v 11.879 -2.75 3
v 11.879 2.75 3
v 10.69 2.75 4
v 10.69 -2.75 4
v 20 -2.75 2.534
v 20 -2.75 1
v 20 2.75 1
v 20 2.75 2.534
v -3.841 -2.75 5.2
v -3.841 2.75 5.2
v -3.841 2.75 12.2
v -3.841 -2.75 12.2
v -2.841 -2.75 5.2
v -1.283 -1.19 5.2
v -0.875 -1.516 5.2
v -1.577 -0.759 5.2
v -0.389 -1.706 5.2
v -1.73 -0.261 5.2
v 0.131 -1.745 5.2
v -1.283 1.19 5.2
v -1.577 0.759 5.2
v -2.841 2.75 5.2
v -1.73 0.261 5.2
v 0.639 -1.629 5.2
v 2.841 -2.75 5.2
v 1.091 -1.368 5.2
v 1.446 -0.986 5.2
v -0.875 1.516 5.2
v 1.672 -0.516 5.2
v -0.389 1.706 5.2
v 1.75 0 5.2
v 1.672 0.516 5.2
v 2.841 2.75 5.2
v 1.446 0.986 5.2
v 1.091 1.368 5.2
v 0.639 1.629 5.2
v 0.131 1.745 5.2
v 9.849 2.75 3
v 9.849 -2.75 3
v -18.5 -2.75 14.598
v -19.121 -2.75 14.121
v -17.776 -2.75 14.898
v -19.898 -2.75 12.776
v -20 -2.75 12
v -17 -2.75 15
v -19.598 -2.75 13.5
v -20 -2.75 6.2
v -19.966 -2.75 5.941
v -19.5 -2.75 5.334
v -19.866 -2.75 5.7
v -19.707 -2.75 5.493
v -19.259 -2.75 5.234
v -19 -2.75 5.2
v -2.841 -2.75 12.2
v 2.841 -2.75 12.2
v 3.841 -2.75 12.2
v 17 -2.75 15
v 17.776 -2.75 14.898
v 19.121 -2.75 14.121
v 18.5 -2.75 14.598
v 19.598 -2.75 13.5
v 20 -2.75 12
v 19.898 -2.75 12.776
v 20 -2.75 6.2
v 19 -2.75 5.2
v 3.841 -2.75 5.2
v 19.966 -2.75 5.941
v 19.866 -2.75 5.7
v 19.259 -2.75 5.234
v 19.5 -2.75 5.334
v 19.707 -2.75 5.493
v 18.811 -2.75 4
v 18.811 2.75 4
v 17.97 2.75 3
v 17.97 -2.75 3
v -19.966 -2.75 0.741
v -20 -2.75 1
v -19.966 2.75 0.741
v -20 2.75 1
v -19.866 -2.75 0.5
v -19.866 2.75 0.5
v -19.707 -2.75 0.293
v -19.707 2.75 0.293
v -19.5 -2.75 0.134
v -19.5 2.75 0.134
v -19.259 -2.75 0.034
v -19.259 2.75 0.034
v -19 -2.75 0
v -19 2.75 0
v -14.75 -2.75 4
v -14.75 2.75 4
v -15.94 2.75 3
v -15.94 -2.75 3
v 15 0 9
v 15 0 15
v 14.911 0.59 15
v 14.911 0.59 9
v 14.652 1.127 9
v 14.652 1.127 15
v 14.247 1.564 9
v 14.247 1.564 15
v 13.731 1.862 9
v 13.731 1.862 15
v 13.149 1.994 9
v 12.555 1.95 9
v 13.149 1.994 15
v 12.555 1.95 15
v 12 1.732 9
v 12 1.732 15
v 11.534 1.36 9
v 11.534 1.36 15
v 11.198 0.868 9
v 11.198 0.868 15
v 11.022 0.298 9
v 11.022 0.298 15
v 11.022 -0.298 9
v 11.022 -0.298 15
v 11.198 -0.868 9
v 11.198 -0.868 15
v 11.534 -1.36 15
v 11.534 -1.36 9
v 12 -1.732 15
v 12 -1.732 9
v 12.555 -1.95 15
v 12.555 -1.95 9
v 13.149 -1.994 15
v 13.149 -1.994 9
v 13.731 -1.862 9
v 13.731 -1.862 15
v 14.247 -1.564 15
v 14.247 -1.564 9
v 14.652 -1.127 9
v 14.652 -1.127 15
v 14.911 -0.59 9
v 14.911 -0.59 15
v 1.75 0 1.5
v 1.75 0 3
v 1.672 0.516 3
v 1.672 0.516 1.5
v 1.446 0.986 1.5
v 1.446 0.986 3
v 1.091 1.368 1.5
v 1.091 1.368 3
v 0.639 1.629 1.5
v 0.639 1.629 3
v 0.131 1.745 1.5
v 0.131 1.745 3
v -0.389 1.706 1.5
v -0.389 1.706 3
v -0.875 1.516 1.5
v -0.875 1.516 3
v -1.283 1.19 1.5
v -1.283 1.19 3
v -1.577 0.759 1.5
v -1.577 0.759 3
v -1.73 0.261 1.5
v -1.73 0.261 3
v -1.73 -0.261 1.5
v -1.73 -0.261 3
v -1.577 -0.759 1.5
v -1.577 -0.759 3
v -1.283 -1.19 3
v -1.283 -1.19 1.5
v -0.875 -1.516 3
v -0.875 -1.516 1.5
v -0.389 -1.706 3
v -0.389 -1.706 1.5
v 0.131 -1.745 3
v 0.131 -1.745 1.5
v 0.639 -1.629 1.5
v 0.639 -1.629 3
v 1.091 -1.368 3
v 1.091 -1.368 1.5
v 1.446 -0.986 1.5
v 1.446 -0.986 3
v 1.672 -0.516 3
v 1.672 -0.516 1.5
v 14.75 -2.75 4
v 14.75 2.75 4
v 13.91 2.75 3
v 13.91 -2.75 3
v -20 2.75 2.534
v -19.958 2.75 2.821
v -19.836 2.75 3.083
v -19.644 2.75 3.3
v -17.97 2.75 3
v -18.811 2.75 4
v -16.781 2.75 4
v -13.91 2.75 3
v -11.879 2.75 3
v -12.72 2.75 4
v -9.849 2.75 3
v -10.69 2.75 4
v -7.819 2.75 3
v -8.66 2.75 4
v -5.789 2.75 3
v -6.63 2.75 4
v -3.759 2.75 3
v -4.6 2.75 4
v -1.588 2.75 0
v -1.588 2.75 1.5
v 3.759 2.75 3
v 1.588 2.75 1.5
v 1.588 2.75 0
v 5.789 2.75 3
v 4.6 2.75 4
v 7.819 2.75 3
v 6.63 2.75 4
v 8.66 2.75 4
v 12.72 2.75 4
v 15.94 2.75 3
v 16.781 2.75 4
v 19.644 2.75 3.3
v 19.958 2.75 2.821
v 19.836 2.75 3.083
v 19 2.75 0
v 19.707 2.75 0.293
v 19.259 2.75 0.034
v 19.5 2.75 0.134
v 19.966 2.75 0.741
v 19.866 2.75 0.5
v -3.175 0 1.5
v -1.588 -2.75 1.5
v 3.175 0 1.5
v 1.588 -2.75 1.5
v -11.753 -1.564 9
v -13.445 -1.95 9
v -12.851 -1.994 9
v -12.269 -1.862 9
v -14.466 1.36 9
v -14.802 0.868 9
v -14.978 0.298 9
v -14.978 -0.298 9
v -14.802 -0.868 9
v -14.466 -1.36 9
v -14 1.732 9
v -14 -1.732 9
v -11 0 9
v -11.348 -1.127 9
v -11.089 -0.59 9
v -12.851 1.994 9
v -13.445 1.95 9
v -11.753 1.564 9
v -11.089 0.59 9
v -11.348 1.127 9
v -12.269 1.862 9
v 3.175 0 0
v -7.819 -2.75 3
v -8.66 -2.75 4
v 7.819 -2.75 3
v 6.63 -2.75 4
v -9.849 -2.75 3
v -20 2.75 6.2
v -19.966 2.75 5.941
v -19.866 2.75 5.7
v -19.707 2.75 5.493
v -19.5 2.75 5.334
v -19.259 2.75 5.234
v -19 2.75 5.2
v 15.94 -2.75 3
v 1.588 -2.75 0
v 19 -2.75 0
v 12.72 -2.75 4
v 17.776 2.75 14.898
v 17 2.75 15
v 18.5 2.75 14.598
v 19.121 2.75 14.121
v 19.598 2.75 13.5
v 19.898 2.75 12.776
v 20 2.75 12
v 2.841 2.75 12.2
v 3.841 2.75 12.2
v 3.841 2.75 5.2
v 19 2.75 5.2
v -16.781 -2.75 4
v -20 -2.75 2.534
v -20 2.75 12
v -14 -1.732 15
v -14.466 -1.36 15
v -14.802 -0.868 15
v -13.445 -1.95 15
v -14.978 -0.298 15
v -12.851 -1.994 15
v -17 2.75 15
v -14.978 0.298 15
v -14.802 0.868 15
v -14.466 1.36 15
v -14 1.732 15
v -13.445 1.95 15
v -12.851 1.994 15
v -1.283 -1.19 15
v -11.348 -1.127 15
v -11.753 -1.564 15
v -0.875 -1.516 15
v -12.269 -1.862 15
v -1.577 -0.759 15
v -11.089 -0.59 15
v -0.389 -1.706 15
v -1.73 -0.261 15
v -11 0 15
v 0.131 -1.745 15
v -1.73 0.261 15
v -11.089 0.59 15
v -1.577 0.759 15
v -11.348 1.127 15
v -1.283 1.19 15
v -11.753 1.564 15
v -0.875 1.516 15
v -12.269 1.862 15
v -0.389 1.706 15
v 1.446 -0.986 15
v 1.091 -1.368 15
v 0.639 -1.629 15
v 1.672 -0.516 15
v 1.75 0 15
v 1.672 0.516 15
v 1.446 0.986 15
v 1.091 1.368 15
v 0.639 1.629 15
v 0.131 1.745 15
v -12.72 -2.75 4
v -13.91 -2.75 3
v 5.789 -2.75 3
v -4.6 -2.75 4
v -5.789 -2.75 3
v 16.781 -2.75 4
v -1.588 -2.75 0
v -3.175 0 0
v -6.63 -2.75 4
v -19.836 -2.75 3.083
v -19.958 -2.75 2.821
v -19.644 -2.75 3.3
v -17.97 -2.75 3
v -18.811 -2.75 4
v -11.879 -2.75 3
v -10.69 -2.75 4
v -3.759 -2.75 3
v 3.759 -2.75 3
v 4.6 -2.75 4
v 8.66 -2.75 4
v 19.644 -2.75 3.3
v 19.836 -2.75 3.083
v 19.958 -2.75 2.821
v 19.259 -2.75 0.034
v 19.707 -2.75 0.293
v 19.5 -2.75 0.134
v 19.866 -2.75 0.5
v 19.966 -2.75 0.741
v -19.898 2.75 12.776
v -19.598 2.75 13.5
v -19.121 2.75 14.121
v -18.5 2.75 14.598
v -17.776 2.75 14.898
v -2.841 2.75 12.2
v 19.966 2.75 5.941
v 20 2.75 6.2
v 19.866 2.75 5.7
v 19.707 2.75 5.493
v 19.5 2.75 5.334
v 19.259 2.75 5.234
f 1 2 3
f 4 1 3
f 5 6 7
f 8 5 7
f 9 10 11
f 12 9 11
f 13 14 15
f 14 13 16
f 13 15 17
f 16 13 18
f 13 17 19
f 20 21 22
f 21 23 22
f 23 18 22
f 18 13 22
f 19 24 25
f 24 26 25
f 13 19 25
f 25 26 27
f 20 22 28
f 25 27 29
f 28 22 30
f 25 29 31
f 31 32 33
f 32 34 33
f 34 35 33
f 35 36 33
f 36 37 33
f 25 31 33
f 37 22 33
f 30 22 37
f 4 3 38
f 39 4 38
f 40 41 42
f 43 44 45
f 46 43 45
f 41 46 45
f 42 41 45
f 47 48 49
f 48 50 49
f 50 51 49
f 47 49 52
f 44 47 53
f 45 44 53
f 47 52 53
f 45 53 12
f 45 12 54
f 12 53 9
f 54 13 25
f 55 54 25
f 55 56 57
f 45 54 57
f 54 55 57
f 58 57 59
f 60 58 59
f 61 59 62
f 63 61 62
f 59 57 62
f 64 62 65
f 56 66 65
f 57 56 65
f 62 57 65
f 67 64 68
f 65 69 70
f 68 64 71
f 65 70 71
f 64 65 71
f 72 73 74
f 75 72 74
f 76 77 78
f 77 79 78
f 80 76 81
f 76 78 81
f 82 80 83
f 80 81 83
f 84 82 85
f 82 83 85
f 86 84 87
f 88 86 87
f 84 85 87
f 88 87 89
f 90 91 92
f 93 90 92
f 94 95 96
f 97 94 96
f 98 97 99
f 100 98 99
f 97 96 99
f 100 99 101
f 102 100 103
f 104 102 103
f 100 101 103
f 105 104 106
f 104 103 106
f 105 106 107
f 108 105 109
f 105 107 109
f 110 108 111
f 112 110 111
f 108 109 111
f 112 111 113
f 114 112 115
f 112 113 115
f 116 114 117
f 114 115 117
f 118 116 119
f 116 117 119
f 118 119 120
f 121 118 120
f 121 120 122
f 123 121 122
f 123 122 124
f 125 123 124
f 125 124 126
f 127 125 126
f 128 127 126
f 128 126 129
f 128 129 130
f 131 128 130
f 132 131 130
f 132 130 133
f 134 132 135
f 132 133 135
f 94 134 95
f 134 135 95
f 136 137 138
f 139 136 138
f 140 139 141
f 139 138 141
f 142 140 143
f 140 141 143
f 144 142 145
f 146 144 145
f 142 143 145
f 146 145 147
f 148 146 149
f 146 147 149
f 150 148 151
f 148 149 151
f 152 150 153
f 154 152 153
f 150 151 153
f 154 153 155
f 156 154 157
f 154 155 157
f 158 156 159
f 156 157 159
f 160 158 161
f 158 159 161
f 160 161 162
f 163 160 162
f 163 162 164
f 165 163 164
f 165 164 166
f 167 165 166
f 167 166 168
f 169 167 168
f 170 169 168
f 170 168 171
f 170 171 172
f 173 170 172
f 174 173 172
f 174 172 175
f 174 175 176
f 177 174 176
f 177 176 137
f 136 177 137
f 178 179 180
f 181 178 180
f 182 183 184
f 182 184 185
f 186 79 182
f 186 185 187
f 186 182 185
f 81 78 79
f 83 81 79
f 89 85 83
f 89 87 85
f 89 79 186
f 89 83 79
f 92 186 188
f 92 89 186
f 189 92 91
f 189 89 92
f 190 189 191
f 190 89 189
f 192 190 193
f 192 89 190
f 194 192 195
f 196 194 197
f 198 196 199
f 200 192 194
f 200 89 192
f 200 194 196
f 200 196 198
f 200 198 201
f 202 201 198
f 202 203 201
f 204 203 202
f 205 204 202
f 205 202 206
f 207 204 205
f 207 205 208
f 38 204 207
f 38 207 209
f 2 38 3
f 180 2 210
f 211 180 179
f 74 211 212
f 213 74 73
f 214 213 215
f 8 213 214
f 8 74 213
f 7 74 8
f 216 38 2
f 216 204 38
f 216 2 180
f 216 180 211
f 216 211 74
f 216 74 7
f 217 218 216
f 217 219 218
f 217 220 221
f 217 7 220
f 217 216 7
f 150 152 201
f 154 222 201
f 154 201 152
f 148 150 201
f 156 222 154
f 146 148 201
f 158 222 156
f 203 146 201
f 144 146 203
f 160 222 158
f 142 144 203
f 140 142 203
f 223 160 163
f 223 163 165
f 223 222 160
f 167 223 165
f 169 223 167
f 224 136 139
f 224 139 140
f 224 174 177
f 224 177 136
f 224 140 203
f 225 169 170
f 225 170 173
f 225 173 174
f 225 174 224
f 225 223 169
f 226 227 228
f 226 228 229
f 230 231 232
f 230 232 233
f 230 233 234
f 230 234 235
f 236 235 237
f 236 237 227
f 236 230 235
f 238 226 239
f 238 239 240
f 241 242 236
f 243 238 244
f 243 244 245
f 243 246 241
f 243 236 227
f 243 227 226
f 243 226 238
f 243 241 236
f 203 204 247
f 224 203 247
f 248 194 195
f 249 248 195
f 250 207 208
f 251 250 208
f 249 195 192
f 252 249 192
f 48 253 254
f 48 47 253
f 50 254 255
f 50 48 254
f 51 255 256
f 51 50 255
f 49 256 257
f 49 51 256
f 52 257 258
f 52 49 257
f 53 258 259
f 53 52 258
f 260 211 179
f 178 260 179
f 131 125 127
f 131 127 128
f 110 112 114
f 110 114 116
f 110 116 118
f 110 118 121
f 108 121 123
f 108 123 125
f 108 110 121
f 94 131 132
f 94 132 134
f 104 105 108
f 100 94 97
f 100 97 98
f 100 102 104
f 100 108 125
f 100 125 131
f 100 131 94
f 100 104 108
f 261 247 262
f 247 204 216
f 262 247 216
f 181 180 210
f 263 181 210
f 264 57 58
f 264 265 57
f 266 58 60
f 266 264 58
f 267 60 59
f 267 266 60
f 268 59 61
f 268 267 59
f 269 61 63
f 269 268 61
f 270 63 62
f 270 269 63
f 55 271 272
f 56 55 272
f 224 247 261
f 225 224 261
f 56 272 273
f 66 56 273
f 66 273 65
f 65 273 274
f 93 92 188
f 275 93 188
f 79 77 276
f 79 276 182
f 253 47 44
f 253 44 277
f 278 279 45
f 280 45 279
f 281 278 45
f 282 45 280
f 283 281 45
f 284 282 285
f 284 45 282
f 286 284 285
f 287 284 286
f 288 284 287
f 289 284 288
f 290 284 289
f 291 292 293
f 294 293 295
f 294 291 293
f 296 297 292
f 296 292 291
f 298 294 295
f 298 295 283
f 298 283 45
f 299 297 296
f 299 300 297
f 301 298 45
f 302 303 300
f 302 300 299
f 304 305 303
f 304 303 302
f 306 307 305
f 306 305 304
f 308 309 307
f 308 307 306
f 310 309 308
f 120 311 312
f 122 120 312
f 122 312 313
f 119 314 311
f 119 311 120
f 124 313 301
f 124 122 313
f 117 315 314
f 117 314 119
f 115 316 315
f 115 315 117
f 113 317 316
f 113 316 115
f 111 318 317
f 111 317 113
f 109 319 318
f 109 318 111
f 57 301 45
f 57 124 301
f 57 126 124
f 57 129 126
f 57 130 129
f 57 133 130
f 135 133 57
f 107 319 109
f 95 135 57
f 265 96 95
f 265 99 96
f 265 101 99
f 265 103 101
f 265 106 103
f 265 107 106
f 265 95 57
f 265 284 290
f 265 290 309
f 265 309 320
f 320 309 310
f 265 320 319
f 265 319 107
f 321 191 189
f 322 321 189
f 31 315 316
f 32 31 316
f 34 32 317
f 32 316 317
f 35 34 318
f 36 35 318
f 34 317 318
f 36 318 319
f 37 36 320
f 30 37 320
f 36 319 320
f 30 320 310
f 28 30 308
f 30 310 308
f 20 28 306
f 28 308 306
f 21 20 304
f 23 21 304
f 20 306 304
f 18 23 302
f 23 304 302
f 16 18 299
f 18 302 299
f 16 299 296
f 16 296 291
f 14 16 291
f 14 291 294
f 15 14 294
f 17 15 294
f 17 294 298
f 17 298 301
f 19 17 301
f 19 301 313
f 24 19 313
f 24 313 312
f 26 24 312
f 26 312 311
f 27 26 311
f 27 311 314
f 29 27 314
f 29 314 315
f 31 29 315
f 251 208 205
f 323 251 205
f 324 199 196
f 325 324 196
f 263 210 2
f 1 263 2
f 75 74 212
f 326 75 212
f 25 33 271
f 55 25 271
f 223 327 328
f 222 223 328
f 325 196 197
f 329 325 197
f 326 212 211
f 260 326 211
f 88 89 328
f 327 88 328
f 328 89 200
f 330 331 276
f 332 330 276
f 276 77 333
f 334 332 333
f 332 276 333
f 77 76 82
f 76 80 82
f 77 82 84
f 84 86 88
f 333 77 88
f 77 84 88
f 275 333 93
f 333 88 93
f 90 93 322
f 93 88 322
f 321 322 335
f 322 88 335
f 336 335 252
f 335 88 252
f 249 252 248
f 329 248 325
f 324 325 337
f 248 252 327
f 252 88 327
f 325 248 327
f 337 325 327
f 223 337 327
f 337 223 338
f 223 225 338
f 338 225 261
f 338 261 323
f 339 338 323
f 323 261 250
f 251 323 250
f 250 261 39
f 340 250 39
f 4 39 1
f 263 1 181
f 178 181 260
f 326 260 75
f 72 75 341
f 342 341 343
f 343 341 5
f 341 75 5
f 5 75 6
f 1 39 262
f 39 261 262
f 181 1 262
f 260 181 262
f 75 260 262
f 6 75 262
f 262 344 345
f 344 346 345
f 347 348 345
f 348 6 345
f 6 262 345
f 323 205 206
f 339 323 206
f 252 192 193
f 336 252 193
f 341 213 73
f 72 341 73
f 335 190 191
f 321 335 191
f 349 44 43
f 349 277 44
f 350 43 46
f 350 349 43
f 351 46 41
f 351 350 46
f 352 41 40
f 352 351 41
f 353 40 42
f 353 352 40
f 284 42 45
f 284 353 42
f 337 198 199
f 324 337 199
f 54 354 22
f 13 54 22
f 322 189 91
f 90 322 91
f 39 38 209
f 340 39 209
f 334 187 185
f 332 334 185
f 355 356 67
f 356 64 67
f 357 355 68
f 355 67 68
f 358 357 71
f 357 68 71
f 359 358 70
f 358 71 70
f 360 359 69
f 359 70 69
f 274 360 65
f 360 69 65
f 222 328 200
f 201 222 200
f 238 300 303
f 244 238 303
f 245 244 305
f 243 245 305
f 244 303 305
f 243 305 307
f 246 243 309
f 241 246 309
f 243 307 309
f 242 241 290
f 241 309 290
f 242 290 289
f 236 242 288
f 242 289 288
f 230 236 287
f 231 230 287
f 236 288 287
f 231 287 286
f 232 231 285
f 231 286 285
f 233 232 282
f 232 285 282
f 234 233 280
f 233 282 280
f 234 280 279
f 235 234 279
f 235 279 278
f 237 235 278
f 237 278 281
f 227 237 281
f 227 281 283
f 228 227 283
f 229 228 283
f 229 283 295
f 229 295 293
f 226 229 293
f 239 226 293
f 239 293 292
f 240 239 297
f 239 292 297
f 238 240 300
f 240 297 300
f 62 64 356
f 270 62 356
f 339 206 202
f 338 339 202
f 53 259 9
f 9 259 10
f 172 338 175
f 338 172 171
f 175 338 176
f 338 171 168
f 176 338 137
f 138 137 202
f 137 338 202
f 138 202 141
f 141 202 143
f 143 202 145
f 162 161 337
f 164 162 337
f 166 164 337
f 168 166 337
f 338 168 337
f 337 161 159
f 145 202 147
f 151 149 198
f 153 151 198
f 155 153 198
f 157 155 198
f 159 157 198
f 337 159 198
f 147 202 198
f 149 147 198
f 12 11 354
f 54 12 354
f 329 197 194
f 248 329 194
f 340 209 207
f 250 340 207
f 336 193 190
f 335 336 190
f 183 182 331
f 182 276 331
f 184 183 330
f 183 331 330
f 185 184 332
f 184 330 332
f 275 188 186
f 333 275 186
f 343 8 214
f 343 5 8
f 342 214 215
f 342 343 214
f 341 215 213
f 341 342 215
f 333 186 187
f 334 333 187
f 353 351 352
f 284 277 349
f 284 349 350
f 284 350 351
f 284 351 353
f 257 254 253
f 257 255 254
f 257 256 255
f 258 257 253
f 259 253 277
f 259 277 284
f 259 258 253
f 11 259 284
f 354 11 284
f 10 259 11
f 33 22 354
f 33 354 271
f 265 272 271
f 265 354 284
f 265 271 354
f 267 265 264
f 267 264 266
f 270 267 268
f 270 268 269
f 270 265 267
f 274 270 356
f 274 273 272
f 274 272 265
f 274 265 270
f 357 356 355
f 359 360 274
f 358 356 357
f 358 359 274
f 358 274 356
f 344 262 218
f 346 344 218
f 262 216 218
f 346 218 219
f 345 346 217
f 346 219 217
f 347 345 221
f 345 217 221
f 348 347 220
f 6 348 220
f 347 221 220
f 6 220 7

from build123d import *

# Parameters (mm, degrees)
F0_W      = 40
F0_H      = 5.5
F1_DEPTH  = 15
F3_DEPTH  = 6
F4_R      = 3
F5_R      = 2
F6_DEPTH  = 6
F7_R      = 1
F9_DEPTH  = 1.5
F10_R     = 1.75
F11_DEPTH = 25


# Not quite as in the source:
# - a feature names something its author has since deleted; it is built from what else it names


with BuildPart() as f1:
    # F0 (on Top) → F1 (new body)
    with BuildSketch(Plane.XY):
        Rectangle(F0_W, F0_H)
    extrude(amount=F1_DEPTH)

    # F2 (on face) → F3 (cut)
    with BuildSketch(Plane(origin=(0, 2.75, 0), x_dir=(-1, 0, 0), z_dir=(0, 1, 0))):
        Polygon((0, 3), (3.758946807, 3), (4.599775356, 4), (5.7890784562, 3), (6.6299070052, 4), (7.8192101053, 3), (8.6600386543, 4), (9.8493417544, 3), (10.6901703034, 4), (11.8794734035, 3), (12.7203019525, 4), (13.9096050526, 3), (14.7504336016, 4), (15.9397367018, 3), (16.7805652508, 4), (17.9698683509, 3), (18.8106968999, 4), (20, 3), (20, 5.2), (3.8406314086, 5.2), (3.8406314086, 12.2), (2.8406314086, 12.2), (2.8406314086, 5.2), (0, 5.2), (-2.8406314086, 5.2), (-2.8406314086, 12.2), (-3.8406314086, 12.2), (-3.8406314086, 5.2), (-20, 5.2), (-20, 3), (-18.8106968999, 4), (-17.9698683509, 3), (-16.7805652508, 4), (-15.9397367018, 3), (-14.7504336016, 4), (-13.9096050526, 3), (-12.7203019525, 4), (-11.8794734035, 3), (-10.6901703034, 4), (-9.8493417544, 3), (-8.6600386543, 4), (-7.8192101053, 3), (-6.6299070052, 4), (-5.7890784562, 3), (-4.599775356, 4), (-3.758946807, 3), align=None)
    extrude(amount=-F3_DEPTH, mode=Mode.SUBTRACT)

    # F4
    f4_edges = [f1.edges().sort_by_distance(p)[0] for p in [
        (-20, 0, 15),
        (20, 0, 15),
    ]]
    fillet(f4_edges, radius=F4_R)

    # F5 (on face) → F6 (cut)
    with BuildSketch(Plane.XY.offset(15)):
        with Locations((-13, 0)):
            Circle(F5_R)
        with Locations((13, 0)):
            Circle(F5_R)
    extrude(amount=-F6_DEPTH, mode=Mode.SUBTRACT)

    # F7
    f7_edges = [f1.edges().sort_by_distance(p)[0] for p in [
        (-20, 0, 5.2),
        (-20, 0, 0),
        (20, 0, 0),
        (20, 0, 5.2),
        (-20, 0, 3),
        (20, 0, 3),
    ]]
    fillet(f7_edges, radius=F7_R)

    # F8 (on face) → F9 (cut)
    with BuildSketch(Plane(origin=(0, 0, 0), x_dir=(1, 0, 0), z_dir=(0, 0, -1))):
        Polygon((-1.5877132403, -2.75), (1.5877132403, -2.75), (3.1754264805, 0), (1.5877132403, 2.75), (-1.5877132403, 2.75), (-3.1754264805, 0), align=None)
    extrude(amount=-F9_DEPTH, mode=Mode.SUBTRACT)

    # F10 (on face) → F11 (cut)
    with BuildSketch(Plane.XY.offset(15)):
        Circle(F10_R)
    extrude(amount=-F11_DEPTH, mode=Mode.SUBTRACT)


solid = f1.part
